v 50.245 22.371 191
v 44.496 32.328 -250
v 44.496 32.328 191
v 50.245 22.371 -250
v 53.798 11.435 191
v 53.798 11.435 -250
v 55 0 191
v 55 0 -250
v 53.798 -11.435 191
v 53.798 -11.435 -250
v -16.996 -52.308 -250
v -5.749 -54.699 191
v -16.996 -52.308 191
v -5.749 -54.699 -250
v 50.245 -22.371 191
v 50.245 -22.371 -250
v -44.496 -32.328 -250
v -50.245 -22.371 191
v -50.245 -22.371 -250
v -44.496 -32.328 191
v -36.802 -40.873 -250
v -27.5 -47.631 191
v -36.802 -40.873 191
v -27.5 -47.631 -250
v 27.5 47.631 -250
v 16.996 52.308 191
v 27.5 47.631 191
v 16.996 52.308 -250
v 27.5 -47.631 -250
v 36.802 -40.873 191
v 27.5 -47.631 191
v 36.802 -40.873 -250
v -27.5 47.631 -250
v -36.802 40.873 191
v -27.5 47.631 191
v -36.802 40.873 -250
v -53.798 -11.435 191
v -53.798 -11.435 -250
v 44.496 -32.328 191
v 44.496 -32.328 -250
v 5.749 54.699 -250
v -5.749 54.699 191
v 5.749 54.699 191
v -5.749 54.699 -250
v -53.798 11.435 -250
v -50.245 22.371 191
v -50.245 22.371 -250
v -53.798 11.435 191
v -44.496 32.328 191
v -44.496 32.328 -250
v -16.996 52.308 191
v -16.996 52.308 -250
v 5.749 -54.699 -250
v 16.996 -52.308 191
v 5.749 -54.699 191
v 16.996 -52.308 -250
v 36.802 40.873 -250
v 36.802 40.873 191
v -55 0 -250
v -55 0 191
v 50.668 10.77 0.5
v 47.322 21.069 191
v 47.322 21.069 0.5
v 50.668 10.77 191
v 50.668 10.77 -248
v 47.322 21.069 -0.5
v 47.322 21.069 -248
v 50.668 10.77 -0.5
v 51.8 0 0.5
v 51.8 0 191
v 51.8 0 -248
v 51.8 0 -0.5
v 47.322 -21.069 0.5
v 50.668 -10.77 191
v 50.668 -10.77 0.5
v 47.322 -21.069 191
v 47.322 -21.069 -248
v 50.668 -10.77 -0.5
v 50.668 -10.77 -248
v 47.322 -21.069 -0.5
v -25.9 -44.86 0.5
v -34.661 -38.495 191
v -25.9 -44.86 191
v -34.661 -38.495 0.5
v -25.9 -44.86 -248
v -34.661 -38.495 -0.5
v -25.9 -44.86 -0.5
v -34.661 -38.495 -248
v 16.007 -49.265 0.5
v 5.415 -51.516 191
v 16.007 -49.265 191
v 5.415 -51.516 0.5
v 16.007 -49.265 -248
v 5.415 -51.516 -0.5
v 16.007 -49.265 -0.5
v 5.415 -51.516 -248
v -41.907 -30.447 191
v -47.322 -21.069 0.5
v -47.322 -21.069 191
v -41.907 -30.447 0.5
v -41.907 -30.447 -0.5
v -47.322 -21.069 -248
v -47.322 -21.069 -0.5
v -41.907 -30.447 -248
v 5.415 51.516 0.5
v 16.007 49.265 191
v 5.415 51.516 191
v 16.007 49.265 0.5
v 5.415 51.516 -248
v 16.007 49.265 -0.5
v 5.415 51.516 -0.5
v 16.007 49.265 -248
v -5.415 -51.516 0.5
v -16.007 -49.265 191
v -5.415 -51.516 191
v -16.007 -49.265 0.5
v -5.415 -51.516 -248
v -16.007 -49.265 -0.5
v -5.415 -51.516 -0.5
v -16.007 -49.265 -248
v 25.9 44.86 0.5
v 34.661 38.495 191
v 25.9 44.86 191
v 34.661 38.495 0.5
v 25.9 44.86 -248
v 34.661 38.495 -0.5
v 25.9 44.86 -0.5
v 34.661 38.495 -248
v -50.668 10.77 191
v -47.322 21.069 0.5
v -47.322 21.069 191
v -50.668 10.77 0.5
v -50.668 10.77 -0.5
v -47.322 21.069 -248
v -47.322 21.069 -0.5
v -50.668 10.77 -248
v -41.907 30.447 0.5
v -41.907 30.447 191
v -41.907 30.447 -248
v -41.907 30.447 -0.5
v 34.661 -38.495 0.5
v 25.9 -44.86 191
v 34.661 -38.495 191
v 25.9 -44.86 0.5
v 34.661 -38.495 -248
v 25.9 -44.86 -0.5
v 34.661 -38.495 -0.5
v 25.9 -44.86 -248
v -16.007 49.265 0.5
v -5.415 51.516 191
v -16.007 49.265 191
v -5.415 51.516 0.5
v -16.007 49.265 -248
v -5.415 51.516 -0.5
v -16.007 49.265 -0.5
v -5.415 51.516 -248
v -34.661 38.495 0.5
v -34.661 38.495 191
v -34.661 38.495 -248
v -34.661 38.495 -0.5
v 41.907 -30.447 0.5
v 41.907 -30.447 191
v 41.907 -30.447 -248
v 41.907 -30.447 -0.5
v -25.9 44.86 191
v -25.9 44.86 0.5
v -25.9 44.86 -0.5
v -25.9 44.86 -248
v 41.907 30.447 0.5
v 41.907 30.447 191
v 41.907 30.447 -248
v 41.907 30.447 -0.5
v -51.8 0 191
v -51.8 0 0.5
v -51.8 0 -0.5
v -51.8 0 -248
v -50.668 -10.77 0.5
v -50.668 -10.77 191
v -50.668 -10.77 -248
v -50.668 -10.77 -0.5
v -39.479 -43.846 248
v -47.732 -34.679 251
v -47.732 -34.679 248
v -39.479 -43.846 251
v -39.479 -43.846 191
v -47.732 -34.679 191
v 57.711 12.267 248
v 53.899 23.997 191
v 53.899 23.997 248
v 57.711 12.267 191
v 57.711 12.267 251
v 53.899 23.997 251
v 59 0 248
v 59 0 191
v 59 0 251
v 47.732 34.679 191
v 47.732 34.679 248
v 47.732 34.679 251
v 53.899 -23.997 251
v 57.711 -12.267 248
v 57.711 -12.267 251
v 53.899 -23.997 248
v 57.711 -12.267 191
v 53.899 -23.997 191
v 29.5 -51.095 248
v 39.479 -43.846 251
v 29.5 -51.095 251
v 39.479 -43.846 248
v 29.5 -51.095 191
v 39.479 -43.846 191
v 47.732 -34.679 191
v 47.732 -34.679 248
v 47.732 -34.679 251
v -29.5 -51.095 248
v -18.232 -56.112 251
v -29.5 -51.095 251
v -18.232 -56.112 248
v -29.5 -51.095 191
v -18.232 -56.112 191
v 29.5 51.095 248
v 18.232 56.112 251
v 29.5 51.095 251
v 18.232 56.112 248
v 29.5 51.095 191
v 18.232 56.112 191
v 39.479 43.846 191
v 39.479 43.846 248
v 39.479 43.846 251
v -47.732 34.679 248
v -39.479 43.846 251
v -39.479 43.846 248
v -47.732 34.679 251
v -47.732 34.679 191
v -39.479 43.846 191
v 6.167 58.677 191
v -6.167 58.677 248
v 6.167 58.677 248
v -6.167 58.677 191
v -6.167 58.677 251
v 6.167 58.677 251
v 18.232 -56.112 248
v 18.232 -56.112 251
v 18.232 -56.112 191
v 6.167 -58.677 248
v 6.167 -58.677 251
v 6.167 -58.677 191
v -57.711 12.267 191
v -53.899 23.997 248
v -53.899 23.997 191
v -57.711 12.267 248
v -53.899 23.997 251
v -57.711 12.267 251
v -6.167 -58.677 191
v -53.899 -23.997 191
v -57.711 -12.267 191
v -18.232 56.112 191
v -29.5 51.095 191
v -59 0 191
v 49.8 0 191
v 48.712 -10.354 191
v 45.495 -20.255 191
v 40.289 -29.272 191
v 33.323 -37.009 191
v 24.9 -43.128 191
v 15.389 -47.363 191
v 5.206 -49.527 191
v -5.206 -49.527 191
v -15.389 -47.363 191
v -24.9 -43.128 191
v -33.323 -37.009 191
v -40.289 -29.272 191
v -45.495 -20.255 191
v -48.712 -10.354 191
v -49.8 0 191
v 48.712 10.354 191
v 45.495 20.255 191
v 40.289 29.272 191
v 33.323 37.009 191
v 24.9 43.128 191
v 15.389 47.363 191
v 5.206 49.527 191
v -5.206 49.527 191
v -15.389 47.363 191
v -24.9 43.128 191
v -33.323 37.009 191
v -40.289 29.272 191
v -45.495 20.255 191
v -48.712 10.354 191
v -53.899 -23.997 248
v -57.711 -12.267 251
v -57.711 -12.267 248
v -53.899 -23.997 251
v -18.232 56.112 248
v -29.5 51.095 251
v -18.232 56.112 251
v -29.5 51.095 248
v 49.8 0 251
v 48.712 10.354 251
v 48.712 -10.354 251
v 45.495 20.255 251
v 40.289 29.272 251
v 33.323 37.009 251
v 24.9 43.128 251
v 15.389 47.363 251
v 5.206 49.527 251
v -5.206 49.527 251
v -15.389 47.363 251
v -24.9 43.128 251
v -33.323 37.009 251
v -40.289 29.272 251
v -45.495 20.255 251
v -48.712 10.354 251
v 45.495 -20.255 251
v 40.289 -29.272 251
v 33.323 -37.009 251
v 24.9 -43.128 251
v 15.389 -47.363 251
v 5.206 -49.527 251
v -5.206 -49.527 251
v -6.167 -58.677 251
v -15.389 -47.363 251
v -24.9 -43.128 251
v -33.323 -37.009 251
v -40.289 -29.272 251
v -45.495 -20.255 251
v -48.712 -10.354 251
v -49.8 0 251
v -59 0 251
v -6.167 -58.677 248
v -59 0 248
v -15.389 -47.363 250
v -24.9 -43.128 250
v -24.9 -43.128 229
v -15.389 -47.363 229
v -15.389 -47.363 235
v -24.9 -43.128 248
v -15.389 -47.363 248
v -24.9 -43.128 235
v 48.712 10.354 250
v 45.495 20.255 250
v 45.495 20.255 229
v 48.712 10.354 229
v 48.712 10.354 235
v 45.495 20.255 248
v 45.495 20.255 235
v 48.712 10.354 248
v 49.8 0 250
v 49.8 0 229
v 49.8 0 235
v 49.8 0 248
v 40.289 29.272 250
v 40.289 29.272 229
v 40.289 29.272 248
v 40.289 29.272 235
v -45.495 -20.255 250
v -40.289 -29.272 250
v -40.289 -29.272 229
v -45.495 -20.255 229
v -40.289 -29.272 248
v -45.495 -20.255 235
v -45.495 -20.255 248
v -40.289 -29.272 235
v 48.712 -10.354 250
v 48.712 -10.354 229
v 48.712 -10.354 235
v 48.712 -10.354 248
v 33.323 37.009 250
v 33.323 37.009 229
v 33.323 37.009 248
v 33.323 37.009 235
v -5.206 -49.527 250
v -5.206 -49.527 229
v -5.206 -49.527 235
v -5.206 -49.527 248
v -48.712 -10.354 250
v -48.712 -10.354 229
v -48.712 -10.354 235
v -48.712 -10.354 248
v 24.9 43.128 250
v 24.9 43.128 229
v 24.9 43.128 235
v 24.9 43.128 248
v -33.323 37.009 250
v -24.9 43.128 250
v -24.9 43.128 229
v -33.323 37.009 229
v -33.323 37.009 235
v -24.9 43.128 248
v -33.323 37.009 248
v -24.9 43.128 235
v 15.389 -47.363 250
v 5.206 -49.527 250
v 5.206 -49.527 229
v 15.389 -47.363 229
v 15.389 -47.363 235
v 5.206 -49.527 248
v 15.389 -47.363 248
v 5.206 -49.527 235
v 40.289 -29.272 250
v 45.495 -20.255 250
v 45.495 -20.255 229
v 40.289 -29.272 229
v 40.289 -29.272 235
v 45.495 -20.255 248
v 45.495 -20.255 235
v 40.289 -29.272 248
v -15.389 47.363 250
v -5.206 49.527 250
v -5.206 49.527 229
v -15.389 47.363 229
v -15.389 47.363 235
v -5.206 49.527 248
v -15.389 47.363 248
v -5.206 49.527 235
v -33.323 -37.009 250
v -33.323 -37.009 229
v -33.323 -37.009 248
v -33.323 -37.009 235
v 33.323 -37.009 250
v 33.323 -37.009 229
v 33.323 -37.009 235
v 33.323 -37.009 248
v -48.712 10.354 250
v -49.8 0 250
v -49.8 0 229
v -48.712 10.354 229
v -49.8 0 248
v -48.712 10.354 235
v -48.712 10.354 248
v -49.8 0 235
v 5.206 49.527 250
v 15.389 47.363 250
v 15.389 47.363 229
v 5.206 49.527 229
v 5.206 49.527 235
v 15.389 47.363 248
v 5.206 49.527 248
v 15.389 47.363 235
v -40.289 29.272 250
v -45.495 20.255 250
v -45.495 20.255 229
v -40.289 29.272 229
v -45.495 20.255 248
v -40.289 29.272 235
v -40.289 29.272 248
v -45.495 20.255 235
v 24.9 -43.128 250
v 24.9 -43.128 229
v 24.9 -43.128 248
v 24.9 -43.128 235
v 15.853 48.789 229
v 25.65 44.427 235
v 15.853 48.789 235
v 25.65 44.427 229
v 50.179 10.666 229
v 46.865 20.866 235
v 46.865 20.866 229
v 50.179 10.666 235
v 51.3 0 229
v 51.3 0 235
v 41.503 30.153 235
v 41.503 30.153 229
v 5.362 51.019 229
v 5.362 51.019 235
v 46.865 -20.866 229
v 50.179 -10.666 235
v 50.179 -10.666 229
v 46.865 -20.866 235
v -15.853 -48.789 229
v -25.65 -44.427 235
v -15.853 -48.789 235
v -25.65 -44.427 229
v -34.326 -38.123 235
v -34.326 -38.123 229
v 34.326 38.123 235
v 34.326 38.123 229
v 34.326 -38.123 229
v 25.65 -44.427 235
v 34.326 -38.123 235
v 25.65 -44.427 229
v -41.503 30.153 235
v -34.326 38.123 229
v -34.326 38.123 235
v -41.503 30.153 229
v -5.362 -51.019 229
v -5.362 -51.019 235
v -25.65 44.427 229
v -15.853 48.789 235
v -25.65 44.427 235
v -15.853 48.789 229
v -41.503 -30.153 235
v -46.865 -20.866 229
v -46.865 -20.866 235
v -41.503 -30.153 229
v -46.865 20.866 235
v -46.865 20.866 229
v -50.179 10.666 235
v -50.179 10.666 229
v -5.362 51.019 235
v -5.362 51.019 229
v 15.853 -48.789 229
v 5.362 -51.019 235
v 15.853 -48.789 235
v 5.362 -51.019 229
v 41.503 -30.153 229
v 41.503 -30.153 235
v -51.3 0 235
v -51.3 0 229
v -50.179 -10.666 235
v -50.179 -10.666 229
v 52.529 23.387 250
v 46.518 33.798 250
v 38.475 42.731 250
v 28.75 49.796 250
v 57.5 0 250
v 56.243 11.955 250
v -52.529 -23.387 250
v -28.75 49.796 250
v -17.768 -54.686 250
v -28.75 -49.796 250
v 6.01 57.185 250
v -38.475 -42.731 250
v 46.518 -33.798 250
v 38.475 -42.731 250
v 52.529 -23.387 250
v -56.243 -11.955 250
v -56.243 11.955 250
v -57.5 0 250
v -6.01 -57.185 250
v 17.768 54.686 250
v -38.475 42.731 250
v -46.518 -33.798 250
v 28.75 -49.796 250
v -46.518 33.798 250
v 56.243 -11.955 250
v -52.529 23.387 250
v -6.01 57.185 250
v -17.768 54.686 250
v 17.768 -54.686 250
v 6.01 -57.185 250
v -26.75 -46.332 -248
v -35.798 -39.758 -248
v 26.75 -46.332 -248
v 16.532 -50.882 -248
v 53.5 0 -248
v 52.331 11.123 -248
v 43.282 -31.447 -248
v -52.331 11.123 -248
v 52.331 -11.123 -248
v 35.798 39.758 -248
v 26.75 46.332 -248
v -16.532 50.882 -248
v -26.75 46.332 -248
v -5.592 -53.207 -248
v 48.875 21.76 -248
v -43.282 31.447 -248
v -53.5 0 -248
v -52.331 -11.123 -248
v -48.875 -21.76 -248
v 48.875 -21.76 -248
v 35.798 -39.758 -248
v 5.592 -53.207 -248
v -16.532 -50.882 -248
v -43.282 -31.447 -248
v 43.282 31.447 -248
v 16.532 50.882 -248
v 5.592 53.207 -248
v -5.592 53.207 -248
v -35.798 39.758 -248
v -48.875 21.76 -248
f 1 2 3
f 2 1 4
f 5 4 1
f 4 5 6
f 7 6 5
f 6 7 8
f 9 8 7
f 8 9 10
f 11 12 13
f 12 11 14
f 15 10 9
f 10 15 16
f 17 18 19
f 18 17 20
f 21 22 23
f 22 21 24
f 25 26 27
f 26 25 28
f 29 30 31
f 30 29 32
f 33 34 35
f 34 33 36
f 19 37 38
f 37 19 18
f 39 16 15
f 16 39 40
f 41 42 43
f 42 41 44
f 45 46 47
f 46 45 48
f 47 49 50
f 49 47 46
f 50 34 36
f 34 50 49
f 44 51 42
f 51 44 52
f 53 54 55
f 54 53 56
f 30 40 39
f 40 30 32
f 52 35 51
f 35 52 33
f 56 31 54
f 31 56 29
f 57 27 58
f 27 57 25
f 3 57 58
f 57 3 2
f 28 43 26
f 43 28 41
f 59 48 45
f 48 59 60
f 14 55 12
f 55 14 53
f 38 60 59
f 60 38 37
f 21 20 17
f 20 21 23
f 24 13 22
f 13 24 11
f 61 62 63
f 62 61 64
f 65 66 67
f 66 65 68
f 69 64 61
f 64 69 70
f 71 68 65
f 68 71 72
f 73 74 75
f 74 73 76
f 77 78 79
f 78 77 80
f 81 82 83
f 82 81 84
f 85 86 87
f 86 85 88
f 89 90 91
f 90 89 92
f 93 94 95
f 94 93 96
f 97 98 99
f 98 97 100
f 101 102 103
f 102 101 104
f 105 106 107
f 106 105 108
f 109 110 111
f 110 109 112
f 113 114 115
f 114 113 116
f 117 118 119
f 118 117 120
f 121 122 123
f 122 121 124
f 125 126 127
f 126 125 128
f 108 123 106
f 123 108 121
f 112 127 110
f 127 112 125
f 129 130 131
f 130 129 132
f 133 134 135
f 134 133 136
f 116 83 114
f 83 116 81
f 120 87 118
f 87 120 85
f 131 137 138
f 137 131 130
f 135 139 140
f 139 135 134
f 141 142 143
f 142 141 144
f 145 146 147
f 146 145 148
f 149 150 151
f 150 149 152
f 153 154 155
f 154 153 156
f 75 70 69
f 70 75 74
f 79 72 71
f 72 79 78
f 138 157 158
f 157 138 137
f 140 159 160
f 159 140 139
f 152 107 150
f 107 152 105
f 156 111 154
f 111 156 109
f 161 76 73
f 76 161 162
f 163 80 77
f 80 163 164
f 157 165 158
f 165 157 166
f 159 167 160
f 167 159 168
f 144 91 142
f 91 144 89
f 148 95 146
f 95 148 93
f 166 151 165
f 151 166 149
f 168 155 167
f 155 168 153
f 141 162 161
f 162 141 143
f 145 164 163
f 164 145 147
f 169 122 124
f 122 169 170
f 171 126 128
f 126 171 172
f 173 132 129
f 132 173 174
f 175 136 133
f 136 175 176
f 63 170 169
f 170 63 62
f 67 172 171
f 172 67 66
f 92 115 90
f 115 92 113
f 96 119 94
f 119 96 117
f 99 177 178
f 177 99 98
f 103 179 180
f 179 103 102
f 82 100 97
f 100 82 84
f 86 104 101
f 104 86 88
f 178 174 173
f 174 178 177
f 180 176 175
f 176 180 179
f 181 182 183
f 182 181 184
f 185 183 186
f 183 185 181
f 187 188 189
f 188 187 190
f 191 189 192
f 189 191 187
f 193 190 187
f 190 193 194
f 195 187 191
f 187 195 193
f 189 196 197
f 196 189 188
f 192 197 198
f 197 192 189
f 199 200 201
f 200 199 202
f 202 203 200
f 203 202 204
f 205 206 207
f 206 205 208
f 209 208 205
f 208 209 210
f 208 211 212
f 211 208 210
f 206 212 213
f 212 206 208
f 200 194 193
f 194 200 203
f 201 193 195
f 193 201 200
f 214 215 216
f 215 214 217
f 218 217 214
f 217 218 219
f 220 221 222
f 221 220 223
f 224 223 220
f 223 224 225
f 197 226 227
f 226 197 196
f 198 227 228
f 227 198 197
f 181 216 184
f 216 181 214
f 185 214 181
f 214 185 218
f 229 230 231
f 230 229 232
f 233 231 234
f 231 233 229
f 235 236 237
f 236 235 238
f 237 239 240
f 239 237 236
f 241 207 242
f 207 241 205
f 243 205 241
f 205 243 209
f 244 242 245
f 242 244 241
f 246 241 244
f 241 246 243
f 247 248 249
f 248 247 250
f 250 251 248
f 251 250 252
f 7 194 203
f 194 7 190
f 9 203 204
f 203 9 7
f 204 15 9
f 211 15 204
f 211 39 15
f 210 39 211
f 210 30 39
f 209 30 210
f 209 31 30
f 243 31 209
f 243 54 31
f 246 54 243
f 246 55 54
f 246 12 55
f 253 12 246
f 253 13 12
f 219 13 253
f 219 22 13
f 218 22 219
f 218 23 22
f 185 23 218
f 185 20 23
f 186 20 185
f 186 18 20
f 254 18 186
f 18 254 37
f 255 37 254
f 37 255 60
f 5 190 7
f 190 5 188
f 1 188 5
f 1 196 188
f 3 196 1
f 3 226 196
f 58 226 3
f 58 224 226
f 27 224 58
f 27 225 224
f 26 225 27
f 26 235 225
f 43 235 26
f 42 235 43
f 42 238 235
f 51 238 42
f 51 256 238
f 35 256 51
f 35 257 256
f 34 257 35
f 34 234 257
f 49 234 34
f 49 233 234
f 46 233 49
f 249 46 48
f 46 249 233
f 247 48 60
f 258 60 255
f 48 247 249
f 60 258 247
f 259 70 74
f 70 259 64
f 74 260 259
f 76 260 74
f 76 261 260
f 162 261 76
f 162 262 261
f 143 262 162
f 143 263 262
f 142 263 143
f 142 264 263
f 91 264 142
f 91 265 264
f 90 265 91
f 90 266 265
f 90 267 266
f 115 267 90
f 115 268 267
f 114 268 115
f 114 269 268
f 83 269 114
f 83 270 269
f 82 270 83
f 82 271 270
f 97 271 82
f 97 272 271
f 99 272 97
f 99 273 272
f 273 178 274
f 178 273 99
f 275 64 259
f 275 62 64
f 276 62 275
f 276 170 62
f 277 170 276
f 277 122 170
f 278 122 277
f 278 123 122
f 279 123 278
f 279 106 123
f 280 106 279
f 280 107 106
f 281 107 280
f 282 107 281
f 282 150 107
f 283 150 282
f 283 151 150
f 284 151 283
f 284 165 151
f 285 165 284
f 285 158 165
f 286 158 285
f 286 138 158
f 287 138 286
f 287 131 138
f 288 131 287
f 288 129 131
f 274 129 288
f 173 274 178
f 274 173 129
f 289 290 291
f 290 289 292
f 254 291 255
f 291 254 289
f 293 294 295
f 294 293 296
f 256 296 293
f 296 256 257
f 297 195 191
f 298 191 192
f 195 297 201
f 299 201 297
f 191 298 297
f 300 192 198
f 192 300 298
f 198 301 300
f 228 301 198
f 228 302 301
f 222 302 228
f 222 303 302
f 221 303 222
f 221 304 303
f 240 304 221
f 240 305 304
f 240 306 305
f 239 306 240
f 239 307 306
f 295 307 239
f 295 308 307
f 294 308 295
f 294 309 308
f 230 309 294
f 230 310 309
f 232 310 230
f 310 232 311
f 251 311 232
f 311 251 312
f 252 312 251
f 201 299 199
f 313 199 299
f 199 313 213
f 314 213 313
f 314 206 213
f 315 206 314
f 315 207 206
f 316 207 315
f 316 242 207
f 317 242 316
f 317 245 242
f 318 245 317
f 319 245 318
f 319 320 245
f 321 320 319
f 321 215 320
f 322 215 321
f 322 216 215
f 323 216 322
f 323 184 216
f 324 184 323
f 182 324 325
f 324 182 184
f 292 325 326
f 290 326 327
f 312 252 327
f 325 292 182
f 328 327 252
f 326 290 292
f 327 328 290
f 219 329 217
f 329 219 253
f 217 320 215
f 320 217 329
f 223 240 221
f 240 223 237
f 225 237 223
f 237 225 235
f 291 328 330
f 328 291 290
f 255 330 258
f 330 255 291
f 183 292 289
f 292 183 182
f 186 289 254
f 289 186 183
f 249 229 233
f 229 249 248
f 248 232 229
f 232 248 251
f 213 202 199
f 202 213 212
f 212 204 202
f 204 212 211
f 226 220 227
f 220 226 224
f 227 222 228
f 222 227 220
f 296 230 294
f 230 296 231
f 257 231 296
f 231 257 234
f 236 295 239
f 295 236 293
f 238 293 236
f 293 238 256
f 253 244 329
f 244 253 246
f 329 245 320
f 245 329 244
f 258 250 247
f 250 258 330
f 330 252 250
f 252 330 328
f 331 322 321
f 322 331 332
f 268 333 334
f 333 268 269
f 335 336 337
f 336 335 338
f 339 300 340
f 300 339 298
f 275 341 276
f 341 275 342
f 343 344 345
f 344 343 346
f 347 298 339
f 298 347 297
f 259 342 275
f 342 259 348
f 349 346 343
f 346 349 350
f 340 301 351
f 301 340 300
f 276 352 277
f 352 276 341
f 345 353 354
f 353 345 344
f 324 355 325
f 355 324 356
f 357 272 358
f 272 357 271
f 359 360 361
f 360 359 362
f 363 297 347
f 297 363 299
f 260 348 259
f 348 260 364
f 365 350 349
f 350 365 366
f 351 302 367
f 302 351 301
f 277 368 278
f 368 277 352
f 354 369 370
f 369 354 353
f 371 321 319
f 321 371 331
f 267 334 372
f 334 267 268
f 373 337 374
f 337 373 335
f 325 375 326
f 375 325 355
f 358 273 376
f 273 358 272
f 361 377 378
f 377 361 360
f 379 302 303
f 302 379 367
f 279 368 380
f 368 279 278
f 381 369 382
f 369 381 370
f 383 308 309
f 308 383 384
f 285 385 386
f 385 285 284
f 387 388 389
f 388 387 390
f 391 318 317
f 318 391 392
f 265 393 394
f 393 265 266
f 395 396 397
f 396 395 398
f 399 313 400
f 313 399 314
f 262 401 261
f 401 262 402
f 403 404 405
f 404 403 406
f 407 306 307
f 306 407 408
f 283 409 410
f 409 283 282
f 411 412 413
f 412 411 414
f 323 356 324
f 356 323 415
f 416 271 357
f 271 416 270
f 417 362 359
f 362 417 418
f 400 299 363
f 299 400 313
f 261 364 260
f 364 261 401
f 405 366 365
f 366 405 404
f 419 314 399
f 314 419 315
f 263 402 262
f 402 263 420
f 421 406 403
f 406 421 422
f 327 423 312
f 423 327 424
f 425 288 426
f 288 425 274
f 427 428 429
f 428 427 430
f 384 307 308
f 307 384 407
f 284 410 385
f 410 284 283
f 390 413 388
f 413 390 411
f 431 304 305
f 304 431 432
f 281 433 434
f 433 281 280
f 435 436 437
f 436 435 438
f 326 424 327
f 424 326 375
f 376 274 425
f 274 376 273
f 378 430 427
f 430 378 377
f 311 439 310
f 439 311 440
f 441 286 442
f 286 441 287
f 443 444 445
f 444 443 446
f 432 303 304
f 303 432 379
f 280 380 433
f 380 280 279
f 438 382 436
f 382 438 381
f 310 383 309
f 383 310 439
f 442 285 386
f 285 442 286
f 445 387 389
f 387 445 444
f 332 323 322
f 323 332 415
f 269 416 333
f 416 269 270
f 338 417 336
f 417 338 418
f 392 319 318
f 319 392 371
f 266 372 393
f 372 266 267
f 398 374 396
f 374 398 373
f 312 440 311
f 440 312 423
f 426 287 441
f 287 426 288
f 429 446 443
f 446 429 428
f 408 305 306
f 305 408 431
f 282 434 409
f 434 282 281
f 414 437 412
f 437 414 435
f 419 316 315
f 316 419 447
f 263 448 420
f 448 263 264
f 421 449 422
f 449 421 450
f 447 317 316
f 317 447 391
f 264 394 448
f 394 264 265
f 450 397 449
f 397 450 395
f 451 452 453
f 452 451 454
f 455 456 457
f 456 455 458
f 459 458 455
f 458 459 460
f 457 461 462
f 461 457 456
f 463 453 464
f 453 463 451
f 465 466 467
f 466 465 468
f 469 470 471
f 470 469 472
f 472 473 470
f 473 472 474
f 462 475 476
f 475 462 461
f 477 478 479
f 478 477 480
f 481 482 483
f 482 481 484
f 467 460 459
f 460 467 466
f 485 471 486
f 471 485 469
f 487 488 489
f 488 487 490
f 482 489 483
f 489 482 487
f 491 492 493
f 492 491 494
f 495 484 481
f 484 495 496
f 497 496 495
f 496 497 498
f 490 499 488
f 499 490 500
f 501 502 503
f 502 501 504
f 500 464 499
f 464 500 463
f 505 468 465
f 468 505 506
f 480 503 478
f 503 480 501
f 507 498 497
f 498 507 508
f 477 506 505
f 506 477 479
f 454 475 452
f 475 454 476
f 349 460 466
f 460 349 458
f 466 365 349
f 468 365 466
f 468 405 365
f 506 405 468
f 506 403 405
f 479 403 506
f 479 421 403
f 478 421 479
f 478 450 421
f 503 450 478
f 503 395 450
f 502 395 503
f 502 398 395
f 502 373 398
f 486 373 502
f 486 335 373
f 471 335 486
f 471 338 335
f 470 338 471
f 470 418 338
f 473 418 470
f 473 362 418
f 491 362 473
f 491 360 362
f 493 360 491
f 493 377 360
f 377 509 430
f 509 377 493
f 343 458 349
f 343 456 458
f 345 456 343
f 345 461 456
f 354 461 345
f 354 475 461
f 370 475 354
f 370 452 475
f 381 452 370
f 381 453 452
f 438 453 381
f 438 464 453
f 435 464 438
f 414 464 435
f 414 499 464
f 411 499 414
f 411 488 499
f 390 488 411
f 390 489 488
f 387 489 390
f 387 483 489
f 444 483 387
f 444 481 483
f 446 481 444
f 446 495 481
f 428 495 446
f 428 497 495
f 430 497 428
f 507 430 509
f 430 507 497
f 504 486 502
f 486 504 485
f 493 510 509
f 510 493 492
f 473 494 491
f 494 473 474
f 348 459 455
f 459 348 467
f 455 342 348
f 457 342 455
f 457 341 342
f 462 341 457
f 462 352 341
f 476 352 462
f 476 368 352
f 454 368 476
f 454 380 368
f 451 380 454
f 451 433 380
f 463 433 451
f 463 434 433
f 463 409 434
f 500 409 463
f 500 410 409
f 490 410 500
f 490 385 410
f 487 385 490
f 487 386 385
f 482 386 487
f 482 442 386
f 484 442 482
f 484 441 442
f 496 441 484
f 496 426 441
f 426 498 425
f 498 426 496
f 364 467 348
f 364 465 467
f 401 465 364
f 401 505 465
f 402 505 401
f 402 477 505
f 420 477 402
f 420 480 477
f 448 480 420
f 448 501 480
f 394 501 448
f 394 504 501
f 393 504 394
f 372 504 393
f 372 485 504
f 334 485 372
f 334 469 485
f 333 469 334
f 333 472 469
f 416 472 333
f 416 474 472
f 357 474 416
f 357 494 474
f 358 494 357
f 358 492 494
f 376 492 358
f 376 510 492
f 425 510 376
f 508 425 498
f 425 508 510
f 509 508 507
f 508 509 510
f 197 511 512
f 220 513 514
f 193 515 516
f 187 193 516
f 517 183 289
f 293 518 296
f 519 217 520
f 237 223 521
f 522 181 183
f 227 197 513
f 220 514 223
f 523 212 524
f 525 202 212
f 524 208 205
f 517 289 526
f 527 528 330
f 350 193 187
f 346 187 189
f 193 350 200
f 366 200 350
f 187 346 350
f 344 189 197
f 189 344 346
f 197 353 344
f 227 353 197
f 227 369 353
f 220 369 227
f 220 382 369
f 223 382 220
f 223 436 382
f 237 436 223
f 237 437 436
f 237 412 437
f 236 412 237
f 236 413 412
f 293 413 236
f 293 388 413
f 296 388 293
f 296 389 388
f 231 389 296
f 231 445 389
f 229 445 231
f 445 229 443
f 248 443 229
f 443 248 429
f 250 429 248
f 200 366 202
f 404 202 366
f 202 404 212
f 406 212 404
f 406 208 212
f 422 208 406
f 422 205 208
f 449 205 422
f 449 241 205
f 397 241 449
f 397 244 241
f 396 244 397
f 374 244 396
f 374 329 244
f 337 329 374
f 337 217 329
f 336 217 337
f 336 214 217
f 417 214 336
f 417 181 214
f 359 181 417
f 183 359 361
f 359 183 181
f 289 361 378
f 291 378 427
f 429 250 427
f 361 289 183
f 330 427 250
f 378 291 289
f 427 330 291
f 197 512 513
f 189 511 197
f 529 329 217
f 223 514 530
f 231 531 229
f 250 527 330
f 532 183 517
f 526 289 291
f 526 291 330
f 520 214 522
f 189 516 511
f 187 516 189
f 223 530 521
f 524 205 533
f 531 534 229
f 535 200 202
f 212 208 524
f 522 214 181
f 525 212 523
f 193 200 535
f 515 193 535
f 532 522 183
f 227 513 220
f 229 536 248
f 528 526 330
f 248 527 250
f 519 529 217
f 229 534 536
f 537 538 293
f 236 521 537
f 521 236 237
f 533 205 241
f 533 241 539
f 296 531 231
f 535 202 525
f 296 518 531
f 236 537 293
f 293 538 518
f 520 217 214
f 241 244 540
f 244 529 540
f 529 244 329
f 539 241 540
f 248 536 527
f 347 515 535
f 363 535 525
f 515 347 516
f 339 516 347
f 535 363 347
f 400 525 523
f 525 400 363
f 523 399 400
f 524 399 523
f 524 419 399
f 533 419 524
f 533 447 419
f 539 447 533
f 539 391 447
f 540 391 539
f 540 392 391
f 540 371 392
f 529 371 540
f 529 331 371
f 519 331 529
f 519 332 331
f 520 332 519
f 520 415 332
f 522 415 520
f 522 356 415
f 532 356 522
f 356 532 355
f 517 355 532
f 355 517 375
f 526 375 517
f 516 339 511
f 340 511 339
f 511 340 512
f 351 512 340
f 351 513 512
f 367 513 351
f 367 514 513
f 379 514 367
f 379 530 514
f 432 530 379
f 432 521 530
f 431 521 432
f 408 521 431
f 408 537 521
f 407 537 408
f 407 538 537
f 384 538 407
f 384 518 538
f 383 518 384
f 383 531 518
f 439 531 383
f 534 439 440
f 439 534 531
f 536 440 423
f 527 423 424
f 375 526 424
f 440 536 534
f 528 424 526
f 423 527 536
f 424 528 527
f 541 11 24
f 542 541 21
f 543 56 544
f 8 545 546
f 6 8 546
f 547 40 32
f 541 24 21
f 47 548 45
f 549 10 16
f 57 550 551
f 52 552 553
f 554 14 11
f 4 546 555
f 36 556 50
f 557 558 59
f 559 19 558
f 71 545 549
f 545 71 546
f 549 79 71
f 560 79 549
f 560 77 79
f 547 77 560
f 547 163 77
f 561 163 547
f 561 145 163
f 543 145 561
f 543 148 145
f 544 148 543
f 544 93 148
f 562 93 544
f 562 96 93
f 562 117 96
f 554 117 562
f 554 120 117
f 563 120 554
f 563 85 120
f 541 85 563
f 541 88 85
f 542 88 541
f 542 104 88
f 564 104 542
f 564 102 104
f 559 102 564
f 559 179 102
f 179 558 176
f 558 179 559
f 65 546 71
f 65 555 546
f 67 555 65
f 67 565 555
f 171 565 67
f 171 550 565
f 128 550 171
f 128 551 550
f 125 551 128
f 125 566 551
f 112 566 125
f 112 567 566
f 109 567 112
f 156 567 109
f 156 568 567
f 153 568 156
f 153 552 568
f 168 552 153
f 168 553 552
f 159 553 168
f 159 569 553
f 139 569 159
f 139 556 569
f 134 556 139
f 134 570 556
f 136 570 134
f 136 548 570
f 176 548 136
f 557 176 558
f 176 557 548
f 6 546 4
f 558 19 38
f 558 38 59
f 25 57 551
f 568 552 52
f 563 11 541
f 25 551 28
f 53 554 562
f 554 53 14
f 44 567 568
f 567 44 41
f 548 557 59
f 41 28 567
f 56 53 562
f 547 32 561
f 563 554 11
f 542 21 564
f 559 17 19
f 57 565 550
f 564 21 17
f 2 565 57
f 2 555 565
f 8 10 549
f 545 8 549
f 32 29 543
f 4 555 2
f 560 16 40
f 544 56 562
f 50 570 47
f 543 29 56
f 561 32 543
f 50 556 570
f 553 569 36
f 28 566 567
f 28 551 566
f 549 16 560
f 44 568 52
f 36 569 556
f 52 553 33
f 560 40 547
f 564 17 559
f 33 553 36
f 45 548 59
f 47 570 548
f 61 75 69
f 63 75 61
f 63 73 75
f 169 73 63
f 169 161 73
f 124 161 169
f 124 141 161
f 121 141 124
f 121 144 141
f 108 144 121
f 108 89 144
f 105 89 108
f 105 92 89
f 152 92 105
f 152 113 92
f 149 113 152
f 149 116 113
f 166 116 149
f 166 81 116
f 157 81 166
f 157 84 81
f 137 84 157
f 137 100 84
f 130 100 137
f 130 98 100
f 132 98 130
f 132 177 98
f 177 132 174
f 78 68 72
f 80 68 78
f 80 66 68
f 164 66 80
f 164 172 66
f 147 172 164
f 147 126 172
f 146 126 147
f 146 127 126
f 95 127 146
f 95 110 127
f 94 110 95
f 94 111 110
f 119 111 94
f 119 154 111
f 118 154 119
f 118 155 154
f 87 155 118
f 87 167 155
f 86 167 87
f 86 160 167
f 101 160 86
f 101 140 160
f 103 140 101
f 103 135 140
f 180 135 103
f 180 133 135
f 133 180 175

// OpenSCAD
// Parameters
pipe_length = 500; //[250:1000:1]
outer_diameter = 110; //[55:220:1]
wall_thickness = 3.2; //[1.6:6.4:0.1]
socket_length = 60; //[30:120:1]
socket_wall_extra = 2.0; //[1.0:4.0:0.1]
socket_outer_extra_radius = 4.0; //[2.0:10.0:0.1]
seal_groove_width = 6.0; //[3.0:12.0:0.1]
seal_groove_depth = 1.5; //[0.8:3.0:0.1]
seal_groove_offset_from_end = 18.0; //[8.0:40.0:0.5]
chamfer_length = 2.0; //[1.0:6.0:0.1]
chamfer_radial = 1.5; //[0.5:4.0:0.1]
overlap = 1.0; //[0.5:2.0:0.1]

// Base Shapes
module pipe_body_outer() {
  translate([0, 0, 0])
    cylinder(h=pipe_length, r=outer_diameter/2, center=true);
}

module inner_bore() {
  translate([0, 0, 0])
    cylinder(h=pipe_length + 2*overlap, r=outer_diameter/2 - wall_thickness, center=true);
}

module socket_outer() {
  translate([0, 0, pipe_length/2 - socket_length/2 + overlap])
    cylinder(h=socket_length, r=outer_diameter/2 + socket_outer_extra_radius, center=true);
}

module socket_inner_bore() {
  translate([0, 0, pipe_length/2 - socket_length/2 + overlap])
    cylinder(h=socket_length + 2*overlap, r=outer_diameter/2 - (wall_thickness + socket_wall_extra), center=true);
}

module seal_groove_cutter() {
  translate([0, 0, pipe_length/2 - seal_groove_offset_from_end])
    cylinder(h=seal_groove_width, r=outer_diameter/2 - (wall_thickness + socket_wall_extra) + seal_groove_depth, center=true);
}

module chamfer_socket_end_outer() {
  translate([0, 0, pipe_length/2 - chamfer_length/2])
    cylinder(h=chamfer_length, r1=outer_diameter/2 + socket_outer_extra_radius, r2=outer_diameter/2 + socket_outer_extra_radius - chamfer_radial, center=true);
}

module chamfer_plain_end_outer() {
  translate([0, 0, -pipe_length/2 + chamfer_length/2])
    cylinder(h=chamfer_length, r1=outer_diameter/2, r2=outer_diameter/2 - chamfer_radial, center=true);
}

module manufacturer_markings() {
  translate([0, 0, 0])
    cylinder(h=overlap, r=outer_diameter/2, center=true);
}

// Operations
module pipe_shell() {
  difference() {
    pipe_body_outer();
    inner_bore();
  }
}

module socket_end() {
  difference() {
    socket_outer();
    socket_inner_bore();
  }
}

module pipe_with_socket() {
  union() {
    pipe_shell();
    socket_end();
  }
}

module pipe_with_seal_groove() {
  difference() {
    pipe_with_socket();
    seal_groove_cutter();
  }
}

module end_chamfers() {
  difference() {
    pipe_with_seal_groove();
    chamfer_socket_end_outer();
    chamfer_plain_end_outer();
  }
}

module final_model() {
  union() {
    end_chamfers();
    manufacturer_markings();
  }
}

// Final Output
final_model();
